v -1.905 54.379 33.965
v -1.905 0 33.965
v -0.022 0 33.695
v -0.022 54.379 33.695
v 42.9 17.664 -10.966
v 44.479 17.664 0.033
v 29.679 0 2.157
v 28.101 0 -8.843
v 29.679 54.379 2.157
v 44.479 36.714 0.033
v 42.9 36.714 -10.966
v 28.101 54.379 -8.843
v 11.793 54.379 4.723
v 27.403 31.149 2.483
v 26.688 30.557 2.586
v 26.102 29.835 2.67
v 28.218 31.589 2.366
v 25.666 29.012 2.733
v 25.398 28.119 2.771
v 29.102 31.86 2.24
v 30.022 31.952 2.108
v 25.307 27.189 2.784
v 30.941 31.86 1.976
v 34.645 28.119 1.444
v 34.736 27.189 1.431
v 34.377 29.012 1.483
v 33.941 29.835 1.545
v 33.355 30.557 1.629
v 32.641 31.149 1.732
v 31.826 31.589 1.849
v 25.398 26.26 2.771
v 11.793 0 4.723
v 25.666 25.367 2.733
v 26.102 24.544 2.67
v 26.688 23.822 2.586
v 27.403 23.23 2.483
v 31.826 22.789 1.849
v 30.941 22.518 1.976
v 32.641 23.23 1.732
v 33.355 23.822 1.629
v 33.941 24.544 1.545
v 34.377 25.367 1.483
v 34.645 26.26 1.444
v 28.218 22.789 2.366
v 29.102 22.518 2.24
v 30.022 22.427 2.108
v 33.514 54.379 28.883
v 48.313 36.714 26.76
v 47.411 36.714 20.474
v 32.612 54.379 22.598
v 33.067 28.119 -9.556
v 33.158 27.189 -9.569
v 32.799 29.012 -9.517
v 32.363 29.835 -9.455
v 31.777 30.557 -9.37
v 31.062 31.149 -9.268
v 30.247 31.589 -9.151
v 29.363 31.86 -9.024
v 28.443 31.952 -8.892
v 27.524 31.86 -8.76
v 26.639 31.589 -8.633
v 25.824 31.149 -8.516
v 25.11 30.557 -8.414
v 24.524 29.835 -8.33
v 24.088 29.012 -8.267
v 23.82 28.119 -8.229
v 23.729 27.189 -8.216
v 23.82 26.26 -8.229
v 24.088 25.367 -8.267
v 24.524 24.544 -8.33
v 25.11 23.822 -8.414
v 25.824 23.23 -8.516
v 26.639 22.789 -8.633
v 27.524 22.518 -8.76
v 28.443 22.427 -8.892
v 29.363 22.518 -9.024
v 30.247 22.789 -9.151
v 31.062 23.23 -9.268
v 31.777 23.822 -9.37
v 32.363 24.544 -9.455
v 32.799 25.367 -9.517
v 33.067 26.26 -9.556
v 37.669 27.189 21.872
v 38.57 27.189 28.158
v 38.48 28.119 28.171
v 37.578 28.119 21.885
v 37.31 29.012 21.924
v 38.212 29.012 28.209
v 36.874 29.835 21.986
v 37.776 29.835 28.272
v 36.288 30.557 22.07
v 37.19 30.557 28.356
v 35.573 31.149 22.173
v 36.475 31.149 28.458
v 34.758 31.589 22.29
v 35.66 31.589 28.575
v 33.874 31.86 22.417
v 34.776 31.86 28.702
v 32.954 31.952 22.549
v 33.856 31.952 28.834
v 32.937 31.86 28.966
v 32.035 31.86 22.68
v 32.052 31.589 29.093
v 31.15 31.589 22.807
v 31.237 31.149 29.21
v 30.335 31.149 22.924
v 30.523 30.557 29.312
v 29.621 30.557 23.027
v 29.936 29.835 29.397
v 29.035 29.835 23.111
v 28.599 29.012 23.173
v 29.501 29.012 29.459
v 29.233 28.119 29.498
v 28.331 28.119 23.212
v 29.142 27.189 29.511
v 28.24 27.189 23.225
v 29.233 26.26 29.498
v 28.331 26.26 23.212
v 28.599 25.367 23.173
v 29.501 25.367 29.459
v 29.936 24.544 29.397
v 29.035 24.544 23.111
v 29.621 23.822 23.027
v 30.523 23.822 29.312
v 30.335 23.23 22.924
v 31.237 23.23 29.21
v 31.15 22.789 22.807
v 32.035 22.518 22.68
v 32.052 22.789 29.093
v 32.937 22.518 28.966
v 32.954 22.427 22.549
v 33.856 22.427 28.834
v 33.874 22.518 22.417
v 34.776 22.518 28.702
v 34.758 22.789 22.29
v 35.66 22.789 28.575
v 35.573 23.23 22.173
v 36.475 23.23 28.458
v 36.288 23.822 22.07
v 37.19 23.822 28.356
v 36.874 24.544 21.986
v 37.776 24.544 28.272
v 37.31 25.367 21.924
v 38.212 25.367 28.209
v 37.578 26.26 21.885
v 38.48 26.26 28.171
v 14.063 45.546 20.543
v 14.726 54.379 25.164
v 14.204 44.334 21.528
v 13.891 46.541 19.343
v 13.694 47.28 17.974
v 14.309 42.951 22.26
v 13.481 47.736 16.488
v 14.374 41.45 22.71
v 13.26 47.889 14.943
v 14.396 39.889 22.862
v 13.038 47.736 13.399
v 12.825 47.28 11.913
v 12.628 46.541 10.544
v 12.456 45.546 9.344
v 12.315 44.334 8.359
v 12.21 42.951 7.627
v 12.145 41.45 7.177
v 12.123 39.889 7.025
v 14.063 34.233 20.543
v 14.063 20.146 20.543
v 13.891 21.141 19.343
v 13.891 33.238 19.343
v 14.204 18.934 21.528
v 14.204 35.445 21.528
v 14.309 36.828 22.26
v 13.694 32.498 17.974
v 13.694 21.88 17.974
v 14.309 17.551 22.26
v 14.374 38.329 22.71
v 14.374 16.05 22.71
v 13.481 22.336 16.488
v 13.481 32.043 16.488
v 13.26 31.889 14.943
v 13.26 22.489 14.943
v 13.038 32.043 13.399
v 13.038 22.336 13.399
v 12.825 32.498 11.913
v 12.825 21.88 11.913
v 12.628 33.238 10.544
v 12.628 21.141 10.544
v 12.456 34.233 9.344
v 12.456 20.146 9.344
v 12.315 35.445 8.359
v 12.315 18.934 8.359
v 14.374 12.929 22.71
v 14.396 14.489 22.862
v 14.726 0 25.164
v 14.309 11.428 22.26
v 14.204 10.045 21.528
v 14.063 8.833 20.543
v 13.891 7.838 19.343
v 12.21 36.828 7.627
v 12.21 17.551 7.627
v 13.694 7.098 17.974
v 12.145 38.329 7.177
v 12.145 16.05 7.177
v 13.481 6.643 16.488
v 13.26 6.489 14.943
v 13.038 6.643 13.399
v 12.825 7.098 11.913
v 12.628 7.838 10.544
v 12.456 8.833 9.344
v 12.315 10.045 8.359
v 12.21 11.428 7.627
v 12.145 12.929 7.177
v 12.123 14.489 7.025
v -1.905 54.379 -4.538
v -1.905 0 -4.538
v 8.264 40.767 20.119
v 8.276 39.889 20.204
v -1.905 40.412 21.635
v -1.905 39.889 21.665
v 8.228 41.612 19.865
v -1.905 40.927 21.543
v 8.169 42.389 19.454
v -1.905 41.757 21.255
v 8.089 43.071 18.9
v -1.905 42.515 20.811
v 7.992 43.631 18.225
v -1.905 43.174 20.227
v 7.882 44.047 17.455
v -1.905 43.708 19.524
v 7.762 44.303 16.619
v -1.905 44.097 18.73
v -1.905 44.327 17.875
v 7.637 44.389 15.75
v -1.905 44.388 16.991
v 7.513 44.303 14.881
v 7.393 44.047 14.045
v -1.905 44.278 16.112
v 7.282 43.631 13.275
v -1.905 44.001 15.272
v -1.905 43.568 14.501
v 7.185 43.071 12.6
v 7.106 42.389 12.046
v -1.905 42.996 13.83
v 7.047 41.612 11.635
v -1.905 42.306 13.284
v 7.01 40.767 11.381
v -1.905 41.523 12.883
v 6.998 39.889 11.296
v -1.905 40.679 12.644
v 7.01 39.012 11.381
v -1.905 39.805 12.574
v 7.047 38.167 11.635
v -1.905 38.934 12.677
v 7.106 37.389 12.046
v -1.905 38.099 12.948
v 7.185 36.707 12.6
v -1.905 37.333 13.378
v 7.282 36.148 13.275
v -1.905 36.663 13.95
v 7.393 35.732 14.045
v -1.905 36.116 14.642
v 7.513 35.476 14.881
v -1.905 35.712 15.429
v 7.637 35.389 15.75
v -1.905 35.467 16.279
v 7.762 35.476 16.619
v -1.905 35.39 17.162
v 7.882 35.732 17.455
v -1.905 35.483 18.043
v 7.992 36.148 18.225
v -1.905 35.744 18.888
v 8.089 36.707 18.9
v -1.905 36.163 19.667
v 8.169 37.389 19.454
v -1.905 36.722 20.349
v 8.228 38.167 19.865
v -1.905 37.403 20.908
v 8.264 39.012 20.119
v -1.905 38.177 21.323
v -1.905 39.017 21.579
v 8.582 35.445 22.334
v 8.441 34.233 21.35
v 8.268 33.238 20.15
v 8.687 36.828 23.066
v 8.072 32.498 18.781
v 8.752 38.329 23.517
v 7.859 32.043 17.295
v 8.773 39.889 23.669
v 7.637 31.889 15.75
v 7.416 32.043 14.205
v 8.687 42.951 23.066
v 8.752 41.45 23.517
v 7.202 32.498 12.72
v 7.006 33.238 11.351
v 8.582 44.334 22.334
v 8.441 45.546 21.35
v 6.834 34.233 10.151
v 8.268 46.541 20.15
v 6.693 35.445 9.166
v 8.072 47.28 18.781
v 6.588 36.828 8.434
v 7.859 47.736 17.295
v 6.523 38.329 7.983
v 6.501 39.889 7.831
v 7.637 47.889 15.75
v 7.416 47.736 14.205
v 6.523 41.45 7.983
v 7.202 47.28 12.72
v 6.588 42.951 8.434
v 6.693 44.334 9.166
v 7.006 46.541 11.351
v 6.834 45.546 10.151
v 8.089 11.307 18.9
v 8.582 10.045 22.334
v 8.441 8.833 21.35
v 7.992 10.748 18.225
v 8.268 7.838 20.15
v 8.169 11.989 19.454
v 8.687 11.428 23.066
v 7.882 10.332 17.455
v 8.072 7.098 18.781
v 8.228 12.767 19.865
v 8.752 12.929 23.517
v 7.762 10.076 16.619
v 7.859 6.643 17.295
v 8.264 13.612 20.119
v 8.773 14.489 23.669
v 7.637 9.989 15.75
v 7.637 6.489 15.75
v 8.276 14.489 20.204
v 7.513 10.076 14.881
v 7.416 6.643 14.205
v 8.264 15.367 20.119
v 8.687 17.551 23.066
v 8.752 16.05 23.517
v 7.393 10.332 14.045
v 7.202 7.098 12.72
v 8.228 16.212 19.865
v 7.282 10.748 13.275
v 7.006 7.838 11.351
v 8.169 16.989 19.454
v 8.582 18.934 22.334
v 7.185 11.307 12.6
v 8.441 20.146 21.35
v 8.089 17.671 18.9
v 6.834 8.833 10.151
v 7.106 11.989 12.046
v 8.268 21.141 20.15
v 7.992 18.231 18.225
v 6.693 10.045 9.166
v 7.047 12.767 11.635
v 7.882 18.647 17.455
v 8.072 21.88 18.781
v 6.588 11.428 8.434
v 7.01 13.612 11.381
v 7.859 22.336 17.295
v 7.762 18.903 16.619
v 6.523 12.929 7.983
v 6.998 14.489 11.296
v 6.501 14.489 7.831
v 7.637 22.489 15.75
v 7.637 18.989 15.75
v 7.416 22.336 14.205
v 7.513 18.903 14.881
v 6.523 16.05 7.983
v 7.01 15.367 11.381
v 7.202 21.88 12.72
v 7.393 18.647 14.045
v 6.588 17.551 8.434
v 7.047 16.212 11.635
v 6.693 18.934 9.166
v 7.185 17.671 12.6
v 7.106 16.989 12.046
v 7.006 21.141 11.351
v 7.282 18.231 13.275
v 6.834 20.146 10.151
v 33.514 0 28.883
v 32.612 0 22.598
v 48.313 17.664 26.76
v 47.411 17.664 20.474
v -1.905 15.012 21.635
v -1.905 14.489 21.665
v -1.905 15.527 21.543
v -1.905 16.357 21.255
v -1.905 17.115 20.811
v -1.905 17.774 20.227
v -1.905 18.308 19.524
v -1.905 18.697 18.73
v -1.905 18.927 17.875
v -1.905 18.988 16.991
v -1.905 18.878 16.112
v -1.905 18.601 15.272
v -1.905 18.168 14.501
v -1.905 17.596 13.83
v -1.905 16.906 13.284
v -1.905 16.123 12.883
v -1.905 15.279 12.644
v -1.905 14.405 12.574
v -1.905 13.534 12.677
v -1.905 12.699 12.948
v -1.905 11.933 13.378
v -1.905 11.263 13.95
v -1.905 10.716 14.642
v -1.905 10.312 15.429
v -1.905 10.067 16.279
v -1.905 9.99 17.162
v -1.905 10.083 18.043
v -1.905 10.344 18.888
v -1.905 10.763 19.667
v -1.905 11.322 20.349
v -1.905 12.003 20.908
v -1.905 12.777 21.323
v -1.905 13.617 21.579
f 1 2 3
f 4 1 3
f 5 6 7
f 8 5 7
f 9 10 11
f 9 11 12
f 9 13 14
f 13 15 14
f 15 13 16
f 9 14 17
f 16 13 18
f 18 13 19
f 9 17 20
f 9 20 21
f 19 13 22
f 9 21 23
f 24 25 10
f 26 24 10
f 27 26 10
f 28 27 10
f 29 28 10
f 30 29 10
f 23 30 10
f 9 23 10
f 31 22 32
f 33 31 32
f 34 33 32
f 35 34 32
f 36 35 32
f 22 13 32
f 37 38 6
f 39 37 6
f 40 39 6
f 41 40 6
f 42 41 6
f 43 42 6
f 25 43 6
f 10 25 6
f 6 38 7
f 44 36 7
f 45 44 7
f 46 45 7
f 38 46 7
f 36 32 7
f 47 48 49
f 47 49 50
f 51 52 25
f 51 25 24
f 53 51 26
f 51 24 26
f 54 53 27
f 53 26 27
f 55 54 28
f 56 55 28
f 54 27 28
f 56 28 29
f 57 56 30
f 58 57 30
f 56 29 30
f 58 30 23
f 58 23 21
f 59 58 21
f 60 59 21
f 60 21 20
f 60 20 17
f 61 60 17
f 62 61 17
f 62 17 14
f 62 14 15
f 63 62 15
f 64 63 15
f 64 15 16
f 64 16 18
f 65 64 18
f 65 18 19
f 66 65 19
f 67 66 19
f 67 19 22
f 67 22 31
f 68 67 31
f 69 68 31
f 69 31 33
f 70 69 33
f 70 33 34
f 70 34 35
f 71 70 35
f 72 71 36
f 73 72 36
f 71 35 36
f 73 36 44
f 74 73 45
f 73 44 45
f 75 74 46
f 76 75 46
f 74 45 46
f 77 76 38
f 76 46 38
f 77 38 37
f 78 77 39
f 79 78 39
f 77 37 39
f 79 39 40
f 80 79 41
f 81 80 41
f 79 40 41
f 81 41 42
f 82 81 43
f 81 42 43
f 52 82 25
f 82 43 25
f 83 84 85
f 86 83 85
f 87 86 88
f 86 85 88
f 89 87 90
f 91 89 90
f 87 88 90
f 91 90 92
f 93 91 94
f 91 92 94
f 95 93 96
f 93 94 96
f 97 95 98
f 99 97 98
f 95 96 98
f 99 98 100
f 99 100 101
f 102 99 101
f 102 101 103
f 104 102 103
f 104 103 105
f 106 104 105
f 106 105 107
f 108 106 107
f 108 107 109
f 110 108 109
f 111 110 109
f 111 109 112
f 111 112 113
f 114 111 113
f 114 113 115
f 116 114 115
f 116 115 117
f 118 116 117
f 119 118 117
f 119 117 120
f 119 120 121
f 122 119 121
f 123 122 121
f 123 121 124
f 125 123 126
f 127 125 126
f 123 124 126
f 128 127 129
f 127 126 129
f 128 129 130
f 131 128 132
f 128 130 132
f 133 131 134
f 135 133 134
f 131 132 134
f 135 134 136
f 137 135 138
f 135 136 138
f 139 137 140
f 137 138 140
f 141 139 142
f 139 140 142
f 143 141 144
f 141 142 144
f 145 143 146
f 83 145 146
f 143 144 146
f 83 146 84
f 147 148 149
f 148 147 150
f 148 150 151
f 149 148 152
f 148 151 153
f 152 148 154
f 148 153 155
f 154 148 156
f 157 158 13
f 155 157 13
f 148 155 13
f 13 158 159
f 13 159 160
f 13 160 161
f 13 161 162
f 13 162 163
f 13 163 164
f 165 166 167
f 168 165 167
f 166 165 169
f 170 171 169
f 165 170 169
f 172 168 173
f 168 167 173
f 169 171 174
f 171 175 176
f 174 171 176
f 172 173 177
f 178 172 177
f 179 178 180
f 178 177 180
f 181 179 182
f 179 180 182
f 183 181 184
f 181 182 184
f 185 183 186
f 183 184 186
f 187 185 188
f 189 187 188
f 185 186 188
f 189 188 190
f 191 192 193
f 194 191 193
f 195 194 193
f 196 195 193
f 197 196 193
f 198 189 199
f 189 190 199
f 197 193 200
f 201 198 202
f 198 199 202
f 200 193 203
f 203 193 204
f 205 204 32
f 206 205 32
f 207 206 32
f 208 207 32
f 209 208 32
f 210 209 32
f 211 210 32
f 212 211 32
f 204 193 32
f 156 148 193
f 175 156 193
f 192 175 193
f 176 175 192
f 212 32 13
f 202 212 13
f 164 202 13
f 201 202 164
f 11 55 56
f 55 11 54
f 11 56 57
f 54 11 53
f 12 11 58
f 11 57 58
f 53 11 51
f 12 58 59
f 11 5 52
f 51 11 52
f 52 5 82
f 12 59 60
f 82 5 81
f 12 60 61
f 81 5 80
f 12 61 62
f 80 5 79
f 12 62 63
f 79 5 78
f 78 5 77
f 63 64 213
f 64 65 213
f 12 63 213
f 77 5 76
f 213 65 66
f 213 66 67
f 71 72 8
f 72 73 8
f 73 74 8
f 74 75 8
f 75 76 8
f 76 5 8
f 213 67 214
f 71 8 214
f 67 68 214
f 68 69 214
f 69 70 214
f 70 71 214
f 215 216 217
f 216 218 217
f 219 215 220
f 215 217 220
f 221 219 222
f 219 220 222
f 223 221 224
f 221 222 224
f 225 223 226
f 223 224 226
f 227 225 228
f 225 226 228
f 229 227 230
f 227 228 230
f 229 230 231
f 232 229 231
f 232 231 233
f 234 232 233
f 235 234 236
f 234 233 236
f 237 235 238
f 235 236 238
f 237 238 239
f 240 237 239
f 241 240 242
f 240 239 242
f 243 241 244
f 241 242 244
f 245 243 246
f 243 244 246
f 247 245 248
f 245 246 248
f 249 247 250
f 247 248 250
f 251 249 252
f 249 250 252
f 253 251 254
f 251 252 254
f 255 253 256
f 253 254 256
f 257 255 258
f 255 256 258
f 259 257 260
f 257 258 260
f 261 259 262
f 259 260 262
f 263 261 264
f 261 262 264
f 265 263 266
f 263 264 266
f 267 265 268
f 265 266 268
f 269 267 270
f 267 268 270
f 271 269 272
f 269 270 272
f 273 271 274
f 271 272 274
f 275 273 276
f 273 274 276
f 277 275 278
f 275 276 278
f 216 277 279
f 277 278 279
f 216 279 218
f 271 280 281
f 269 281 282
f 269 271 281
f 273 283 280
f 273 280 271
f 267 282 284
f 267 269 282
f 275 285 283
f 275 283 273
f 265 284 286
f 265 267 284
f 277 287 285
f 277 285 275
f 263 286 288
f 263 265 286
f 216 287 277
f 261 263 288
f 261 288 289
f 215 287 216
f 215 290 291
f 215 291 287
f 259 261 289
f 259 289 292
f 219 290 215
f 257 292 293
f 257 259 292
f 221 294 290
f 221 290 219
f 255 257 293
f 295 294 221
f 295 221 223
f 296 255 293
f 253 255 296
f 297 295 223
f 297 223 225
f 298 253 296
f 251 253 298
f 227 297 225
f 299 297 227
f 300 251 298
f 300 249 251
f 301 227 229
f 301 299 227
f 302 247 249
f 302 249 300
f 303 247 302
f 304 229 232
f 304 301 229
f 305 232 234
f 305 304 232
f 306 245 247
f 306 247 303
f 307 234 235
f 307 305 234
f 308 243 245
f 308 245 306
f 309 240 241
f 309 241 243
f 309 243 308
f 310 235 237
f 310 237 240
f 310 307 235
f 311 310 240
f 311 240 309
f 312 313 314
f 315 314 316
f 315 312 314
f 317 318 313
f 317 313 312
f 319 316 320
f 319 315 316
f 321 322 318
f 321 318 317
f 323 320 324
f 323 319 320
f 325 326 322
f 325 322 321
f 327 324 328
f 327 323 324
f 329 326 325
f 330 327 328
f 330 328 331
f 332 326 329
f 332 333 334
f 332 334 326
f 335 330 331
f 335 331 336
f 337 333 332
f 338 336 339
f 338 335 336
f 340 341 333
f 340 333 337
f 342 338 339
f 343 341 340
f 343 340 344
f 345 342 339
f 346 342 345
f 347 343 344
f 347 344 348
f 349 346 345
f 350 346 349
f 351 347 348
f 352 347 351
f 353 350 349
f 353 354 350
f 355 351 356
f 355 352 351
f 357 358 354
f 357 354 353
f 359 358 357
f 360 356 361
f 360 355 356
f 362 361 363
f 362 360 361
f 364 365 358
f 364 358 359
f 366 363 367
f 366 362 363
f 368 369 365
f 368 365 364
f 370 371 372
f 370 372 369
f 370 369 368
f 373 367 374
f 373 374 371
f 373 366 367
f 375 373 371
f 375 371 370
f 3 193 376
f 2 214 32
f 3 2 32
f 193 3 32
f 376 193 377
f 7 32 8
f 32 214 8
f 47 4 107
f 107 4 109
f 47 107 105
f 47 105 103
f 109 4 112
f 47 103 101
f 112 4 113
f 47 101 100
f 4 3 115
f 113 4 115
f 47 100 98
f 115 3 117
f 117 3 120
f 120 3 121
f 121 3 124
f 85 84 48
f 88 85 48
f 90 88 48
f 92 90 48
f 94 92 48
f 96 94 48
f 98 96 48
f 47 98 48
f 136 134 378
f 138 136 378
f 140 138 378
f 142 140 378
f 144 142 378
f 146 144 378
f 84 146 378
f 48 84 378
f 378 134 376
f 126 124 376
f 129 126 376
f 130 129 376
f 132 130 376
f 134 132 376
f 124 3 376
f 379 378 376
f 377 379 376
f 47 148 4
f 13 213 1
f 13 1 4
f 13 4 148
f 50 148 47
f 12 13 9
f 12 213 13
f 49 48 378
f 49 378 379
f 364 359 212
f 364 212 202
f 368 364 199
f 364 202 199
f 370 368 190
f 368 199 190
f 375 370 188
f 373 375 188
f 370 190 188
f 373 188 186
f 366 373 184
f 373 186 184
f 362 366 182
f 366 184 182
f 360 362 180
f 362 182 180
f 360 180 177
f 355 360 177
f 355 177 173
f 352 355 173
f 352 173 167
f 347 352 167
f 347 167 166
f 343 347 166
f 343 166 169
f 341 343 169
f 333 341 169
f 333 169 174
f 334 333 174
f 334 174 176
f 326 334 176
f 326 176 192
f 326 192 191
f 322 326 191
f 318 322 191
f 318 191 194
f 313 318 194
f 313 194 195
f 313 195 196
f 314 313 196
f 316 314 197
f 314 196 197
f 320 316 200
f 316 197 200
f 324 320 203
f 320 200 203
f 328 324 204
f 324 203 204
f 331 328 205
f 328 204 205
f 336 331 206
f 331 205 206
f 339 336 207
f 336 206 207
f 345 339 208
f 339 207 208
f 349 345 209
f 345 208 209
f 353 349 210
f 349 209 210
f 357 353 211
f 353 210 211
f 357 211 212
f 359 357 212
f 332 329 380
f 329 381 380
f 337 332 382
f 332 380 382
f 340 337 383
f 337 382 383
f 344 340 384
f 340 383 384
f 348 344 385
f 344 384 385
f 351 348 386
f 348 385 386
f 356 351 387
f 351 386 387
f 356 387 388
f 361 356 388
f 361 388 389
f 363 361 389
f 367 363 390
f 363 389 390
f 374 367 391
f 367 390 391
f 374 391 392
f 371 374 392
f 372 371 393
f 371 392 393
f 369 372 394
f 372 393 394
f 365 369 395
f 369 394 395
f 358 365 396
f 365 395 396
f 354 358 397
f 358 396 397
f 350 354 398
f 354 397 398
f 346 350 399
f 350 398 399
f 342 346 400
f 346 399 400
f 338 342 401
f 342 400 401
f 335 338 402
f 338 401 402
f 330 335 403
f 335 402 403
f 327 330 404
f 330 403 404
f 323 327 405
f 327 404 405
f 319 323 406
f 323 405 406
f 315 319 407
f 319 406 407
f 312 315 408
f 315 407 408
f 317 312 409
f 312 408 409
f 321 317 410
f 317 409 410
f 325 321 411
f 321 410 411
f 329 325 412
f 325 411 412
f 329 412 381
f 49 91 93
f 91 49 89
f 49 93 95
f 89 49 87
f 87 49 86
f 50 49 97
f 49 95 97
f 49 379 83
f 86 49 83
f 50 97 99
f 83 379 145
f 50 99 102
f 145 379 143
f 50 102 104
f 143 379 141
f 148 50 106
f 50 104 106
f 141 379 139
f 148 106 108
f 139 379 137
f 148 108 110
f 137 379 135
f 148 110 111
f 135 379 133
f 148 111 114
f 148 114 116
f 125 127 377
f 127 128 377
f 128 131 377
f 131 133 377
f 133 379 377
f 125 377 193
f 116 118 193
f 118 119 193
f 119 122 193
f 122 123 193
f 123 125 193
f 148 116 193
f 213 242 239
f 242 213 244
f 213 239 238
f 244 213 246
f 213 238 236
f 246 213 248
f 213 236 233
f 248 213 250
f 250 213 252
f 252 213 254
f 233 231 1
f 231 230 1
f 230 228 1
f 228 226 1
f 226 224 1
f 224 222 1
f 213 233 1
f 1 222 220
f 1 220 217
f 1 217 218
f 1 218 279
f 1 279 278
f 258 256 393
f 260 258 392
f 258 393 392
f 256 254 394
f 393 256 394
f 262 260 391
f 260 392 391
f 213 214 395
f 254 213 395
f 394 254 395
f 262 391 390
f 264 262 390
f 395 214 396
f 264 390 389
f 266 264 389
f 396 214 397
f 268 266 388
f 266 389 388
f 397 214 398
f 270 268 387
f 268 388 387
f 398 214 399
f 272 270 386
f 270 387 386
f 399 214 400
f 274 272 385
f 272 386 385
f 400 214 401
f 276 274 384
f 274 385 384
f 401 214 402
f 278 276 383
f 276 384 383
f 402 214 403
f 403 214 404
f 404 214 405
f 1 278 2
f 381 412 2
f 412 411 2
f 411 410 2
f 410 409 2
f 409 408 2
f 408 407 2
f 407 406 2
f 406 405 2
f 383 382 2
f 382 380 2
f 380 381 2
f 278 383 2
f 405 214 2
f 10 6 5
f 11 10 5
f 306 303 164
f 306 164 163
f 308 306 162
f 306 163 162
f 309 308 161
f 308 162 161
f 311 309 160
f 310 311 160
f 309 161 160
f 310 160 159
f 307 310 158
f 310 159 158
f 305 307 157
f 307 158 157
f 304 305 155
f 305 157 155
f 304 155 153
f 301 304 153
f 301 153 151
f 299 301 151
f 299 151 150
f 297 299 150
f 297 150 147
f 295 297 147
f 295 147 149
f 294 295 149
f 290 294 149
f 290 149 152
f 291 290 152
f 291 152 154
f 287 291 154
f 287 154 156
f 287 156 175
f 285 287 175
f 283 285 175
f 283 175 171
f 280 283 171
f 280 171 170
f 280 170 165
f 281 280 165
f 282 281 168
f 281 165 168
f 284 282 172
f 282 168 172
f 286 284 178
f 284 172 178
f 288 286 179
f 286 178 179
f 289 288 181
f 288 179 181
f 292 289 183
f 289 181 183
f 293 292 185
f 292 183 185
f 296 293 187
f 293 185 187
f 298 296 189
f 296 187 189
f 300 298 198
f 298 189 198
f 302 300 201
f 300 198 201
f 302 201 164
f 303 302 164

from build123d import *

# Parameters (mm, degrees)
BOSS_EXTRUDE1_DEPTH                     = 54.37886
SKETCH6_R                               = 4.762499997
CUT_EXTRUDE2_DEPTH                      = 83.40211381
CBORE_FOR_M8_HEX_HEAD_BOLT1_D           = 9
CBORE_FOR_M8_HEX_HEAD_BOLT1_CBORE_D     = 16
CBORE_FOR_M8_HEX_HEAD_BOLT1_CBORE_DEPTH = 5.68


with BuildPart() as part:
    # Sketch1 → Boss-Extrude1 (new body)
    with BuildSketch(Plane(origin=(0, 0, 0), x_dir=(1, 0, 0), z_dir=(0, 1, 0))):
        Polygon((42.900367849, 10.966428676), (-1.905000006, 4.537947795), (-1.905000006, -33.845088532), (-1.905000006, -33.965034077), (-0.021561819, -33.694806492), (48.313185258, -26.759945507), (47.411349635, -20.474311688), (14.726053775, -25.163856927), (11.793284329, -4.722975747), (44.478580189, -0.033430507), align=None)
    extrude(amount=BOSS_EXTRUDE1_DEPTH)

    # Sketch6 → Cut-Extrude2 (cut, through all)
    with BuildSketch(Plane(origin=(4.736440692, 0, 33.012148819), x_dir=(0.9898635935767917, 0, -0.1420213579404182), z_dir=(0.1420213579404182, 0, 0.9898635935767917))):
        with Locations((29.417979377, 27.18943)):
            Circle(SKETCH6_R)
        Polygon((44.022979377, 36.71443), (29.071940537, 54.37886), (44.022979377, 54.37886), align=None)
        Polygon((44.022979377, 0), (44.022979377, 17.66443), (29.071940537, 0), align=None)
    extrude(amount=-CUT_EXTRUDE2_DEPTH, mode=Mode.SUBTRACT)

    # CBORE for M8 Hex Head Bolt1 (through all)
    with Locations(Plane(origin=(10.891448706, 0, -1.562658073), x_dir=(-0.1420213579404179, 0, -0.9898635935767918), z_dir=(0.9898635935767918, 0, -0.1420213579404179))):
        with Locations((-16.6751, 39.88943), (-16.6751, 14.48943)):
            CounterBoreHole(CBORE_FOR_M8_HEX_HEAD_BOLT1_D / 2, CBORE_FOR_M8_HEX_HEAD_BOLT1_CBORE_D / 2, CBORE_FOR_M8_HEX_HEAD_BOLT1_CBORE_DEPTH)


solid = part.part
